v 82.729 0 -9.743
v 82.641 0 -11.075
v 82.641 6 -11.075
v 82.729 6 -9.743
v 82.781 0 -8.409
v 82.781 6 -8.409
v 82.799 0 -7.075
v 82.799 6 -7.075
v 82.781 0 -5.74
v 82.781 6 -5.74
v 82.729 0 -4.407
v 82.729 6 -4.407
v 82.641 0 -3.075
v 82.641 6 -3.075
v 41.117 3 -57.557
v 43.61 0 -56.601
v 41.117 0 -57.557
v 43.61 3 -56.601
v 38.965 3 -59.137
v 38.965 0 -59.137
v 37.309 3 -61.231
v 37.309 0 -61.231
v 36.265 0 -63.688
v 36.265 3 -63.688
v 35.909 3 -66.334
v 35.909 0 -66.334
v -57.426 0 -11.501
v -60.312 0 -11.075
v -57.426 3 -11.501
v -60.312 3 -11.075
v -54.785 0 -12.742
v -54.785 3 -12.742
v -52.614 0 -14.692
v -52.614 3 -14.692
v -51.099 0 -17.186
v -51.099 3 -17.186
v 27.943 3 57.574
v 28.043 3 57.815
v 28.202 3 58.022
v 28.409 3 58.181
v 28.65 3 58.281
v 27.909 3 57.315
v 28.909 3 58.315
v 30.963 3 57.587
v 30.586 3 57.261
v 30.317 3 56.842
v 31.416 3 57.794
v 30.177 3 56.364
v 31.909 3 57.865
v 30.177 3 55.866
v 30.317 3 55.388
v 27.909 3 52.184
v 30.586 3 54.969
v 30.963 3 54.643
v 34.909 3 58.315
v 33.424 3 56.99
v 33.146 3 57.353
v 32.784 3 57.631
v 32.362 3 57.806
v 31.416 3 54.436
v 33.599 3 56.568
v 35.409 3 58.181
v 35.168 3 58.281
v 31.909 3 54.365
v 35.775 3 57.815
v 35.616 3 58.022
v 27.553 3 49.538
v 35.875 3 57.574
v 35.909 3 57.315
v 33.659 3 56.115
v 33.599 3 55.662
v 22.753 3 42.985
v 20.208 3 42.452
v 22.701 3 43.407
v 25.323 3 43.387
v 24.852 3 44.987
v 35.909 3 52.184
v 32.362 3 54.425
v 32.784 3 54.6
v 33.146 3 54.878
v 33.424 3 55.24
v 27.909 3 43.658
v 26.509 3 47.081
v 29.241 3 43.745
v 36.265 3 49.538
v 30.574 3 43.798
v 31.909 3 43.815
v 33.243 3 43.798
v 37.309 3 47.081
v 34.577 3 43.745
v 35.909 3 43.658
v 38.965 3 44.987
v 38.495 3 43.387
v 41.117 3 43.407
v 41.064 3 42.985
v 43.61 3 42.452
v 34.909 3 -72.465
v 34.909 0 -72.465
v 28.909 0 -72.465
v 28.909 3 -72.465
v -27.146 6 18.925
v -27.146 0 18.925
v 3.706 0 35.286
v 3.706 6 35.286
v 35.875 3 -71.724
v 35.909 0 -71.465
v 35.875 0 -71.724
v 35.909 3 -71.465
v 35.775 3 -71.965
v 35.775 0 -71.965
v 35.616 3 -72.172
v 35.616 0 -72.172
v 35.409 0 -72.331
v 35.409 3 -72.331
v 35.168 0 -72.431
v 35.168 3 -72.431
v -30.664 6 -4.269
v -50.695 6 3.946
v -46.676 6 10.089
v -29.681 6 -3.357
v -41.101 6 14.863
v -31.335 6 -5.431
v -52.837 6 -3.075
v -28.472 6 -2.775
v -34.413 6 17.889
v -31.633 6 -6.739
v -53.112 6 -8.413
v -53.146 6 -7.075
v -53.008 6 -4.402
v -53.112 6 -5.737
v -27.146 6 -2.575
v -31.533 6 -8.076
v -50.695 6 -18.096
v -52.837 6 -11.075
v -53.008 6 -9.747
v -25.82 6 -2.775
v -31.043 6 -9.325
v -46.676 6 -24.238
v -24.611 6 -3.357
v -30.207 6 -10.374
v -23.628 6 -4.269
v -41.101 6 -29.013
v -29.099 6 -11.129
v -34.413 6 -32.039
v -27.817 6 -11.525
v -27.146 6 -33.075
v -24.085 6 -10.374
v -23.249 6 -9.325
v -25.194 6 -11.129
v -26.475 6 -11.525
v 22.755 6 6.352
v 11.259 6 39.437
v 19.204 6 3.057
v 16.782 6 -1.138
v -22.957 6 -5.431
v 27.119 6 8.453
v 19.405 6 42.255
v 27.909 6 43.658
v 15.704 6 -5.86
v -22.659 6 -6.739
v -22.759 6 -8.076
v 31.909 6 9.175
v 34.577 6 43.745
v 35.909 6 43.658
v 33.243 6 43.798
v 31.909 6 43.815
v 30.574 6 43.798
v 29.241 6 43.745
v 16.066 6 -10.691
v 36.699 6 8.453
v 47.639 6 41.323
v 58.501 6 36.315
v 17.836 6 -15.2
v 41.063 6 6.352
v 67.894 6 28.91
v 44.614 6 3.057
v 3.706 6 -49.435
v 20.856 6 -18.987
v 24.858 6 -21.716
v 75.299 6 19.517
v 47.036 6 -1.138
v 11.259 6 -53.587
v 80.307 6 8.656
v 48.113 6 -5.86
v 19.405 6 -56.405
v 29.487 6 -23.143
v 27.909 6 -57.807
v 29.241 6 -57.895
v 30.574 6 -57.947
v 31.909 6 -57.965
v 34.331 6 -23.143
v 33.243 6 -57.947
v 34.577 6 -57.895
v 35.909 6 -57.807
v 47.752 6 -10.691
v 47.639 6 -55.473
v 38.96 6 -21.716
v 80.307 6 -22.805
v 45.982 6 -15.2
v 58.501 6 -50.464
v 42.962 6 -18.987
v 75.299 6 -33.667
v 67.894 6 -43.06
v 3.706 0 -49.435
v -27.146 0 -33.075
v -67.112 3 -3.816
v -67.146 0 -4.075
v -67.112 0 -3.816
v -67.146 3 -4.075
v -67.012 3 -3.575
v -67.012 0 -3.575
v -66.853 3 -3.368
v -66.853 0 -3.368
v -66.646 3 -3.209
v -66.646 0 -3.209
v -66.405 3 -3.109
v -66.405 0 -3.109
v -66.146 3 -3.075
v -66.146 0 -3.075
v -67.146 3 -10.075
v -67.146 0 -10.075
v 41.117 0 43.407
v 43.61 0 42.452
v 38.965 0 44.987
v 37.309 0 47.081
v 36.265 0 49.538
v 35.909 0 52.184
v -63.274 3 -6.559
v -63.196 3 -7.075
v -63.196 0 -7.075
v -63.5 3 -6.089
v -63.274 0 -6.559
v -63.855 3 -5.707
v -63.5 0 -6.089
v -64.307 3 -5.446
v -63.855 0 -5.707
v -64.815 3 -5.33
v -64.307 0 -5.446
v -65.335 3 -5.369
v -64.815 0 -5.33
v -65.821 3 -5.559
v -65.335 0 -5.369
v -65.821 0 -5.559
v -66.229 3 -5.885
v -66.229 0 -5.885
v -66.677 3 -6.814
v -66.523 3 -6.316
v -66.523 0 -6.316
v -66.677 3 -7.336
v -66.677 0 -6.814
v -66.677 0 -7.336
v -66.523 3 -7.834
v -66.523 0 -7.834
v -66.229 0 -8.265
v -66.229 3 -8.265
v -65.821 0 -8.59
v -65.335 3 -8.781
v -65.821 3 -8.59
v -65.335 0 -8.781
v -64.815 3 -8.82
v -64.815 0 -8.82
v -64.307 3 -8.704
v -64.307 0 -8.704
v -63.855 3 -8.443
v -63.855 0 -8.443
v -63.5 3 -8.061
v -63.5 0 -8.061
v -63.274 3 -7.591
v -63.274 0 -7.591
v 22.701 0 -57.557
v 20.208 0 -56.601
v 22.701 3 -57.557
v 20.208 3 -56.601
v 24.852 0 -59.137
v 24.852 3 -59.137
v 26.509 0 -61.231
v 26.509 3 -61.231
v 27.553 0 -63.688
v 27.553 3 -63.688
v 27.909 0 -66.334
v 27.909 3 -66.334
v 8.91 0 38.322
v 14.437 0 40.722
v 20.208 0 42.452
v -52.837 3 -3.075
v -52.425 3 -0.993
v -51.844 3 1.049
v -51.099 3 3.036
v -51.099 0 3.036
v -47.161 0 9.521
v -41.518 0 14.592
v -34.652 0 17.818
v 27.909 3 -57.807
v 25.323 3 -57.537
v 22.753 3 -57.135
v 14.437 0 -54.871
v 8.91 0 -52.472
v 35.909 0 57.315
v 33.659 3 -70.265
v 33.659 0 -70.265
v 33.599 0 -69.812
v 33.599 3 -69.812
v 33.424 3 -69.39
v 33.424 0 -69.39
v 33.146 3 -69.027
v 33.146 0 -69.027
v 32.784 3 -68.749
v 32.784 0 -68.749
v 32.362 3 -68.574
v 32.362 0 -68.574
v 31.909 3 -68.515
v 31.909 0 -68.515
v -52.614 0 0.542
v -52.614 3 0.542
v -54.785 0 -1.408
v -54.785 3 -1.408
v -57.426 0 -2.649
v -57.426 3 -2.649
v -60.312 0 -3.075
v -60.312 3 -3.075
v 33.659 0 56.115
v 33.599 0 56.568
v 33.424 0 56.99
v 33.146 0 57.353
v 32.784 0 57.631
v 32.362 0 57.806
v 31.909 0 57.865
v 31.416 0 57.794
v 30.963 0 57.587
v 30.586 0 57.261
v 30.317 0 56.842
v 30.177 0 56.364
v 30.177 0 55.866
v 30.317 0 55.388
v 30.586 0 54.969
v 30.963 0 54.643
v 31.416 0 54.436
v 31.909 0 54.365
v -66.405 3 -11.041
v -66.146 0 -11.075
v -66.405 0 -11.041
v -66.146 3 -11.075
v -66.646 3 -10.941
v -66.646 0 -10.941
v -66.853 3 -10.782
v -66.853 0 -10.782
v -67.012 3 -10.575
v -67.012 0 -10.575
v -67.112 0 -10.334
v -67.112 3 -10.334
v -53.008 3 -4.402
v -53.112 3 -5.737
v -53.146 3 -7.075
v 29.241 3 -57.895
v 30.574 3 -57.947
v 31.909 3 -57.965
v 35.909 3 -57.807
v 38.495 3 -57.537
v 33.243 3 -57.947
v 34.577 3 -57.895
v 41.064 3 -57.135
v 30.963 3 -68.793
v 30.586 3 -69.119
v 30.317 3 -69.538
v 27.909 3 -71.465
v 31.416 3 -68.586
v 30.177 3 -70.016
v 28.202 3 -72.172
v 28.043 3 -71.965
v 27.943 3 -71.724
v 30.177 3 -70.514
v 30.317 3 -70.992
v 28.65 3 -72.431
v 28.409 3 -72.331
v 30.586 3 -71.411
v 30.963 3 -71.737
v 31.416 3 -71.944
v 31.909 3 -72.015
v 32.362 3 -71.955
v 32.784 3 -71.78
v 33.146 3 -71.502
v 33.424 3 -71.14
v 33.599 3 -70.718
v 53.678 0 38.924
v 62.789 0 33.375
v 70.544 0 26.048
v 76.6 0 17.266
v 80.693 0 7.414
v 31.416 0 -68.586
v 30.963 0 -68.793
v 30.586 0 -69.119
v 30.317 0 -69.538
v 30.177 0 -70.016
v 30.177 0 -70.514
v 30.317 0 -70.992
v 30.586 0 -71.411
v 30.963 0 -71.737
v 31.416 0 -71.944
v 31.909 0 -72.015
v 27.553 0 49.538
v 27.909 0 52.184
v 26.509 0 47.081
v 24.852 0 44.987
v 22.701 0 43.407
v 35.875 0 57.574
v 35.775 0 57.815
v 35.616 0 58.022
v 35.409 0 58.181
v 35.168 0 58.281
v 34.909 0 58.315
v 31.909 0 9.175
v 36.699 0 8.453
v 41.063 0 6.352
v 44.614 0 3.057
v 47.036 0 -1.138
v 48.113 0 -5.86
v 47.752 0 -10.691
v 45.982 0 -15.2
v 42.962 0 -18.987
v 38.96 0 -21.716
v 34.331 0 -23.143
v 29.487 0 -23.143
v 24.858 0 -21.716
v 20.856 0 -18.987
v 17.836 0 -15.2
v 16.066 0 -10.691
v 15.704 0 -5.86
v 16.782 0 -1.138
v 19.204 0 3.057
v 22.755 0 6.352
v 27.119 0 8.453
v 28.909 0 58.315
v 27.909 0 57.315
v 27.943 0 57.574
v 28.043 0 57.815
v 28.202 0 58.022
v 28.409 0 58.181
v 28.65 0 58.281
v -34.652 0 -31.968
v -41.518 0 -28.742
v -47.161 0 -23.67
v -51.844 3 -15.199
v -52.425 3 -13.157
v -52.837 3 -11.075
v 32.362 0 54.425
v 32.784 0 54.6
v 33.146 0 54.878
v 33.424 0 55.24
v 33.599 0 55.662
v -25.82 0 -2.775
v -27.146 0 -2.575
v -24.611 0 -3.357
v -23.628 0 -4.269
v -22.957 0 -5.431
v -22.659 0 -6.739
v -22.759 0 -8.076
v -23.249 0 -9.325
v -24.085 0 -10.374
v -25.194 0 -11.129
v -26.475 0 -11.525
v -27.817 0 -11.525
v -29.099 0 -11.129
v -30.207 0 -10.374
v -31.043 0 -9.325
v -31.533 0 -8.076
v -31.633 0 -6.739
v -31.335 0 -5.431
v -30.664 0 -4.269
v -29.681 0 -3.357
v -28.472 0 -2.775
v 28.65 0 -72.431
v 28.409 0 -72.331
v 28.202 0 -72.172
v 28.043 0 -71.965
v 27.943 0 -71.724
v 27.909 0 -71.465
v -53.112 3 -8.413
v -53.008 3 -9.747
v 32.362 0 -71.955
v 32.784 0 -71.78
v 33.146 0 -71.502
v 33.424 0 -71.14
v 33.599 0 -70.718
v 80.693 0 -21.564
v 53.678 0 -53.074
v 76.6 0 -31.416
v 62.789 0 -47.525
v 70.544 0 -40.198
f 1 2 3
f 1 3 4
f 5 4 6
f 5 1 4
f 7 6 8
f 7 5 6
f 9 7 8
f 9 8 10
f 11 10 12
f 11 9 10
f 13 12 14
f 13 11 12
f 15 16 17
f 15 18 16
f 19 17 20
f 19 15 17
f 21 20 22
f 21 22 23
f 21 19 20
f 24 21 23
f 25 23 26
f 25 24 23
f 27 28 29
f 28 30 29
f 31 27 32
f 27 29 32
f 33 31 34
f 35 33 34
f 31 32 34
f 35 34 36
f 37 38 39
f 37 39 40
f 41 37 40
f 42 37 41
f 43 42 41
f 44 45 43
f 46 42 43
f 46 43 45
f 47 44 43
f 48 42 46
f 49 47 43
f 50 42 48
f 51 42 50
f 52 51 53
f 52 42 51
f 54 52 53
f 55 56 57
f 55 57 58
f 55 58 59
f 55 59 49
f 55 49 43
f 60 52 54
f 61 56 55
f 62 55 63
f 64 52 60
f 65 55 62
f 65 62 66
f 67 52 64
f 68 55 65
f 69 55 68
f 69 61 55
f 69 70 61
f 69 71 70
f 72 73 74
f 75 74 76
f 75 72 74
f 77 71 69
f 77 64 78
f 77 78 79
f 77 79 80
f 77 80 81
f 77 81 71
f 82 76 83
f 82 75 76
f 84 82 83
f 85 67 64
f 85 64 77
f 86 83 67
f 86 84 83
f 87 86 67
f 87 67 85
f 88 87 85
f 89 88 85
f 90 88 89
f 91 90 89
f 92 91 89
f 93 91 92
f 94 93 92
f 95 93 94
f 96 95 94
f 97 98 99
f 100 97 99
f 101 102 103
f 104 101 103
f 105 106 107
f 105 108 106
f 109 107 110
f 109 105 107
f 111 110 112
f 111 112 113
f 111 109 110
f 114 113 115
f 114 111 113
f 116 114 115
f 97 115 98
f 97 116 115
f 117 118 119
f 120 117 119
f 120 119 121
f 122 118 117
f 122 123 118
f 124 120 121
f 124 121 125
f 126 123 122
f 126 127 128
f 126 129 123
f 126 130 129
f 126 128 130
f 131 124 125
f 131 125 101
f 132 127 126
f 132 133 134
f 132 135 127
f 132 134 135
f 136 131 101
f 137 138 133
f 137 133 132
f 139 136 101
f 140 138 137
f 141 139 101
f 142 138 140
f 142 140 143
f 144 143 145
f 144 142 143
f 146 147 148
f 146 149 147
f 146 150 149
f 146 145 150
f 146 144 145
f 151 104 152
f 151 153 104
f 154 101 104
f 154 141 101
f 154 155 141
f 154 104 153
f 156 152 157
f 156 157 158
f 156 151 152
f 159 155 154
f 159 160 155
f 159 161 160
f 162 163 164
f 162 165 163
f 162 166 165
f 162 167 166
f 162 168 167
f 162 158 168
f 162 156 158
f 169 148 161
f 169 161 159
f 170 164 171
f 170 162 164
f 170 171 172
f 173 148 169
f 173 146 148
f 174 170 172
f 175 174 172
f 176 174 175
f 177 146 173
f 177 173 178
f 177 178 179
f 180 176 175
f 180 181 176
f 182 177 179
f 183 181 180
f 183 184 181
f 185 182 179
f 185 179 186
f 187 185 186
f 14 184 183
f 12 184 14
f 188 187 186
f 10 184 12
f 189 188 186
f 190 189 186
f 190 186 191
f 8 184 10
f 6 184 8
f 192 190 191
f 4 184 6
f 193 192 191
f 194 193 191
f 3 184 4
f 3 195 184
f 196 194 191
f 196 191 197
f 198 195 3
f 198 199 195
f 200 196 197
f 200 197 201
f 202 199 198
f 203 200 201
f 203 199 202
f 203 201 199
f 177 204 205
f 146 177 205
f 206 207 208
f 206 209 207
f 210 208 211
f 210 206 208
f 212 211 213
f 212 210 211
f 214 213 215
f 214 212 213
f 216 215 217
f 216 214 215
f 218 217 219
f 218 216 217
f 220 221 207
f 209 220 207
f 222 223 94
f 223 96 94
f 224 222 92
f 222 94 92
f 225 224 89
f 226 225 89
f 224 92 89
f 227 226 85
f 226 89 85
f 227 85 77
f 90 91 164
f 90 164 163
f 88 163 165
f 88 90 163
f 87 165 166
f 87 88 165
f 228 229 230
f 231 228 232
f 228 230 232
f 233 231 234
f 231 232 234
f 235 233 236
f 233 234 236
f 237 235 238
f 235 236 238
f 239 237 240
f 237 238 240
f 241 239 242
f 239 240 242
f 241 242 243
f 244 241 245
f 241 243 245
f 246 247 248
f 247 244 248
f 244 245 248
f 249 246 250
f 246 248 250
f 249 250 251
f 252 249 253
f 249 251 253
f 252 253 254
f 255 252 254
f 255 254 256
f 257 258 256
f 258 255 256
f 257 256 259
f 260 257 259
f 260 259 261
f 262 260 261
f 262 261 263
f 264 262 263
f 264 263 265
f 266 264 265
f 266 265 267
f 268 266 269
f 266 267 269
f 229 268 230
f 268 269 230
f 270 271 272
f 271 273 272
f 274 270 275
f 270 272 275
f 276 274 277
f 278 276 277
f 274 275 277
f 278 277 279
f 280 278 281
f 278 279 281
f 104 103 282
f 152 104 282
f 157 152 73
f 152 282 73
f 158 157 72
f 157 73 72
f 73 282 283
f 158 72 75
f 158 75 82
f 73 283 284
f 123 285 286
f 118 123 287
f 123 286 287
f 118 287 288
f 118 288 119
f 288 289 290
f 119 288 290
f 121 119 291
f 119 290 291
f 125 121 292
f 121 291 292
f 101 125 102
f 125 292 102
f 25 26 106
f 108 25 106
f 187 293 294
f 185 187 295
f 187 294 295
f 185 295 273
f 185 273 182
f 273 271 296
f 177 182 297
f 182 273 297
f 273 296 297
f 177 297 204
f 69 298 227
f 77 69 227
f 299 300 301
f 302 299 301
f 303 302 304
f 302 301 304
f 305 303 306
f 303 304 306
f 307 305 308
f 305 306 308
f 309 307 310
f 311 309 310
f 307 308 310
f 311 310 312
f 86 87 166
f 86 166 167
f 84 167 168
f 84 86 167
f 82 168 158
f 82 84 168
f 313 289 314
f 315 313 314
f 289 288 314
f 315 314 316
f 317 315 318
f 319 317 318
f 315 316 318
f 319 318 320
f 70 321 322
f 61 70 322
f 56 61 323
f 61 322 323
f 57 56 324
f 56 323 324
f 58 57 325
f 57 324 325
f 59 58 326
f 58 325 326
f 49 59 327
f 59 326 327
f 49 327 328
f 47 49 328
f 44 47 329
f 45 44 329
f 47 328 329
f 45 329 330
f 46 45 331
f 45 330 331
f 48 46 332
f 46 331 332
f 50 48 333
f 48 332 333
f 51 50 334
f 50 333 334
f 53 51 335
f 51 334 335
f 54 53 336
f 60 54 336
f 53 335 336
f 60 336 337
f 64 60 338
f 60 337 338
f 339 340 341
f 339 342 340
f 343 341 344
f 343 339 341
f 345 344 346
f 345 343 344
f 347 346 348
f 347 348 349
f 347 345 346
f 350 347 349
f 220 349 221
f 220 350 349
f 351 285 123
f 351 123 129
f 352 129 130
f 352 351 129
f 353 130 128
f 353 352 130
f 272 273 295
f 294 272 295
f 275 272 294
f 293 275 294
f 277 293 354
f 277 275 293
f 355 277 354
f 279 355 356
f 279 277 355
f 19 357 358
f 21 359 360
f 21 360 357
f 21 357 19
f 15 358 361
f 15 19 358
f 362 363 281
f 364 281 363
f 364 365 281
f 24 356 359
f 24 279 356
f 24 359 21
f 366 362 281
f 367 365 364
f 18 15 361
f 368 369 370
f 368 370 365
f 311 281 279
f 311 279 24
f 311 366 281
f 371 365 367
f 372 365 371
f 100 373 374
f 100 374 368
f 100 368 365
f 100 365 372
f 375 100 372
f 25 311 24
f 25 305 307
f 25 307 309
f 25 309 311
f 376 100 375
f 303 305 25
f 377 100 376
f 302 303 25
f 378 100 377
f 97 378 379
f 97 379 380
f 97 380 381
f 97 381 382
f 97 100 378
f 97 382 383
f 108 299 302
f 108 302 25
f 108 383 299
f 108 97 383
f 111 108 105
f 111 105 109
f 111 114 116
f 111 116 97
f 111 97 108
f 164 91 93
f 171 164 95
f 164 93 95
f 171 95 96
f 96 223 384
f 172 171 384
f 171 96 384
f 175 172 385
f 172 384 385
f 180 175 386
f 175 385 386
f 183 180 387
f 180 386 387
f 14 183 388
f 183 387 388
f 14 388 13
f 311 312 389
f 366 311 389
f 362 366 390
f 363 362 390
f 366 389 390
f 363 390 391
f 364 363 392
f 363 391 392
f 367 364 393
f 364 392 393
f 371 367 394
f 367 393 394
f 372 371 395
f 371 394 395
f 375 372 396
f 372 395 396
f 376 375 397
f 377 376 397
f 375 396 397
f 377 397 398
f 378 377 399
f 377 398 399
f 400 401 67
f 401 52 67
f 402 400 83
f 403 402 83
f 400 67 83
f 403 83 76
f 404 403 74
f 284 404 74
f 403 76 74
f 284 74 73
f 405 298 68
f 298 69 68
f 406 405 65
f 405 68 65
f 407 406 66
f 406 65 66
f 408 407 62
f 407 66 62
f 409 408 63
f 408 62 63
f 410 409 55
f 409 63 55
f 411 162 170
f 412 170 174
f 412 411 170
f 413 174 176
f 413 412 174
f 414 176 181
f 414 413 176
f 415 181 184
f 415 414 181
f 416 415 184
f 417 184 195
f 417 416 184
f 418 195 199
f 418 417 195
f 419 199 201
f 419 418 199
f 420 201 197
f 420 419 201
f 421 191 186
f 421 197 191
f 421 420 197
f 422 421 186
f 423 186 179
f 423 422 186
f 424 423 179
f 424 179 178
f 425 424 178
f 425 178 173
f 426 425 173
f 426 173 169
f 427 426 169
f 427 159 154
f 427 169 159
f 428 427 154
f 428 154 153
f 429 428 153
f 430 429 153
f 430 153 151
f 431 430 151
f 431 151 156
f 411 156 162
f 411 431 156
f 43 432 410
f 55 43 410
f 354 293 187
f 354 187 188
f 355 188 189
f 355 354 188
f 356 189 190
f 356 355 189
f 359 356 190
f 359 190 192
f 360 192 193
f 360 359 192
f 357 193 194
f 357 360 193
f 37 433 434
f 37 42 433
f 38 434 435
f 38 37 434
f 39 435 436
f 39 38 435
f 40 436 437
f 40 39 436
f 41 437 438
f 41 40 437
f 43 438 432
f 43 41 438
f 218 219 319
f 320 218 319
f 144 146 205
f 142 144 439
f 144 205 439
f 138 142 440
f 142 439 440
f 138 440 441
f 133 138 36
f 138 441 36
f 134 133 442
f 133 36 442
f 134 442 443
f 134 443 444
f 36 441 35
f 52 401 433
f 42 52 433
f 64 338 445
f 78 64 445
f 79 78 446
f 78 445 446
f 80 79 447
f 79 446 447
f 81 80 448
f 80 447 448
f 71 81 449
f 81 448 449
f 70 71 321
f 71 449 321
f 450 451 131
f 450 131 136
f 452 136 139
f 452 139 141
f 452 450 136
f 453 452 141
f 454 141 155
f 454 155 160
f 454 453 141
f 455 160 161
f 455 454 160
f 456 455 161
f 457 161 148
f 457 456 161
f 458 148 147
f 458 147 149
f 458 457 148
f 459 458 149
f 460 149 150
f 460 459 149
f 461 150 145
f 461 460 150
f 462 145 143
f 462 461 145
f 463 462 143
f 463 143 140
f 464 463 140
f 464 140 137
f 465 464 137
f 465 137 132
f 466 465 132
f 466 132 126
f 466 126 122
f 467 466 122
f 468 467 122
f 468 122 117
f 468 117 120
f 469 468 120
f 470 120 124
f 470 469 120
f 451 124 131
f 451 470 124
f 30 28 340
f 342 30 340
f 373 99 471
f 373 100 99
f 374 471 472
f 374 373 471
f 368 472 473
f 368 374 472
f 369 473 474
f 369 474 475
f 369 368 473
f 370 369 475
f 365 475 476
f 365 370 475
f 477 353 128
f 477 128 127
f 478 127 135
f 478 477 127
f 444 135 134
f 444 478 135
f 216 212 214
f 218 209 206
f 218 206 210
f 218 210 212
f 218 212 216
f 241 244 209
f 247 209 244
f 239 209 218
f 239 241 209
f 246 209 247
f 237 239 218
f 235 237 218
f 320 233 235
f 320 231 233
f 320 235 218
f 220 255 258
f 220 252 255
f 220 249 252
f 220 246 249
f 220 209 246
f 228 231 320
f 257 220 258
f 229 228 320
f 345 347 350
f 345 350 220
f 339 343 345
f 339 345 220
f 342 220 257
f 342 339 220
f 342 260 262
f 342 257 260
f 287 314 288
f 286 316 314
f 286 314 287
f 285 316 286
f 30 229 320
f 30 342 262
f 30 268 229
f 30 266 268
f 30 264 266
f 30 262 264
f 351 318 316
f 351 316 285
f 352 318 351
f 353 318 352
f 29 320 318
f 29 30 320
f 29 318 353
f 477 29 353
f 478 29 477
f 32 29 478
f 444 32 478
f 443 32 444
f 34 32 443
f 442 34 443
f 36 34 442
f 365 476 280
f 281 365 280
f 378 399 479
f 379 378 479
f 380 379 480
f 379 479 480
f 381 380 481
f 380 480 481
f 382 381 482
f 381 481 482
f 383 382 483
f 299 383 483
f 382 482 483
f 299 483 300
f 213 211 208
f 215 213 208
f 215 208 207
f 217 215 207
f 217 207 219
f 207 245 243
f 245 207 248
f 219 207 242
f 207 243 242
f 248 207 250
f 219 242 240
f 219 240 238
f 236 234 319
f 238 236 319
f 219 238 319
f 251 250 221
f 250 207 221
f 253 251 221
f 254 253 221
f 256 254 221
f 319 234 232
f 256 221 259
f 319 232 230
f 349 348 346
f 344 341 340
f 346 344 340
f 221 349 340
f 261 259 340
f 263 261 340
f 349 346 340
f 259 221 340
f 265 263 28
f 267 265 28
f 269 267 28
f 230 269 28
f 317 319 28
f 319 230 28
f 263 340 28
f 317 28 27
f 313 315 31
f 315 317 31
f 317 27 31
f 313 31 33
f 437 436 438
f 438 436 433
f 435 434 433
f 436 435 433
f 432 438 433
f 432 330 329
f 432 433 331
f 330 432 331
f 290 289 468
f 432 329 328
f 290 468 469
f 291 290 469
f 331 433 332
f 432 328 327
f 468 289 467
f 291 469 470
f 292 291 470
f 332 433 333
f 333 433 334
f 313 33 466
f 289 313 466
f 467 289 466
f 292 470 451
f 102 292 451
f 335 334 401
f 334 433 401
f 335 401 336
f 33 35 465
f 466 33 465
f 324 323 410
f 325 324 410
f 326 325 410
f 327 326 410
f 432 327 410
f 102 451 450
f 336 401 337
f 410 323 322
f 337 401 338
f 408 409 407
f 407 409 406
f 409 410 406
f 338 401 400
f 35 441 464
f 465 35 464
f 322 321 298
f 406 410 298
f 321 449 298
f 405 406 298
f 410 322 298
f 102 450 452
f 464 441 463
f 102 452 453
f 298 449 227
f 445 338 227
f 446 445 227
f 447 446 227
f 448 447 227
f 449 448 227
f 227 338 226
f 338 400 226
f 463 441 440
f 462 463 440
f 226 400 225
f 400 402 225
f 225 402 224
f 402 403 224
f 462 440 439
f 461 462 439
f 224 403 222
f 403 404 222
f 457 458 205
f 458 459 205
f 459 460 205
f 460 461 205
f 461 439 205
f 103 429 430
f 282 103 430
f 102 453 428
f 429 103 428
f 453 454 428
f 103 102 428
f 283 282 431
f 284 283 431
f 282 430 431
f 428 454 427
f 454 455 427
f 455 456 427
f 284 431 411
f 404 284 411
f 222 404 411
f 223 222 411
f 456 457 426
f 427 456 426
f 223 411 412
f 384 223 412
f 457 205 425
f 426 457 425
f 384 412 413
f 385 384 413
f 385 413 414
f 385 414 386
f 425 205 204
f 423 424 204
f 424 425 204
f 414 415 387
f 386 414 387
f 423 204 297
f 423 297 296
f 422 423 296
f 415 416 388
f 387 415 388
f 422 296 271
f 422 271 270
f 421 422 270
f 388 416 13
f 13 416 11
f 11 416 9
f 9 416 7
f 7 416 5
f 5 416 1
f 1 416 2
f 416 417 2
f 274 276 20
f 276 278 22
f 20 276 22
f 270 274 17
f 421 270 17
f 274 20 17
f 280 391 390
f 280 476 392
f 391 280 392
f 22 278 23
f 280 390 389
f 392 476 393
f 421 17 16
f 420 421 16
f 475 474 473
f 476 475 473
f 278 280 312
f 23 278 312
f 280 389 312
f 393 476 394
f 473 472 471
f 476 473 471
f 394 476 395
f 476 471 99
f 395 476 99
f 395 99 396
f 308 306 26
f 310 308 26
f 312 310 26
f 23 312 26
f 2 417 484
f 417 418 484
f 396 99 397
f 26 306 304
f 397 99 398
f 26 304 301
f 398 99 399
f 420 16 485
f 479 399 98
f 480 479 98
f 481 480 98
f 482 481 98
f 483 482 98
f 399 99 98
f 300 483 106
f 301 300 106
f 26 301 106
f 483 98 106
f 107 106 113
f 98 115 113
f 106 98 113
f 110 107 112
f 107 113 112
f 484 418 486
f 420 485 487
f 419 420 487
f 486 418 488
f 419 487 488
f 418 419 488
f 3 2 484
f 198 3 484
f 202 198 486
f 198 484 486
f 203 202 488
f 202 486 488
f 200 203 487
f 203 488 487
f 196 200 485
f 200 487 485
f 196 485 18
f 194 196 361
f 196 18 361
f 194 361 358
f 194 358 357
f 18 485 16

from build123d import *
from build123d.topology import SkipClean

# Parameters (mm, degrees)
SKETCH1_R           = 4.5
BOSS_EXTRUDE1_DEPTH = 6
BOSS_EXTRUDE5_DEPTH = 6
BOSS_EXTRUDE3_START = -6
BOSS_EXTRUDE3_DEPTH = 6
CUT_EXTRUDE1_START  = -3
CUT_EXTRUDE1_DEPTH  = 3
BOSS_EXTRUDE4_START = -6
BOSS_EXTRUDE4_DEPTH = 6
CUT_EXTRUDE2_START  = -3
CUT_EXTRUDE2_DEPTH  = 3
BOSS_EXTRUDE7_START = -3
BOSS_EXTRUDE7_DEPTH = 3
BOSS_EXTRUDE9_START = -6
BOSS_EXTRUDE9_DEPTH = 6
CUT_EXTRUDE4_START  = -3
CUT_EXTRUDE4_DEPTH  = 3
FILLET1_R           = 1
FILLET2_R           = 10
CUT_EXTRUDE5_START  = -6
CUT_EXTRUDE5_DEPTH  = 6
SKETCH1_6_R         = 16.25
SKETCH1_6_R_2       = 4.5
CUT_EXTRUDE8_DEPTH  = 10


with BuildPart() as part:
    # Sketch1 → Boss-Extrude1 (new body)
    with BuildSketch(Plane(origin=(0, 0, 0), x_dir=(1, 0, 0), z_dir=(0, 1, 0))):
        with BuildLine():
            Line((3.706249193, 49.435224426), (-27.146075319, 33.07485149))
            ThreePointArc((-27.146075319, 33.07485149), (-53.146075319, 7.07485149), (-27.146075319, -18.92514851))
            Line((-27.146075319, -18.92514851), (3.706249193, -35.285521446))
            ThreePointArc((3.706249193, -35.285521446), (82.798924681, 7.07485149), (3.706249193, 49.435224426))
        make_face()
        with Locations(Location((-27.146075319, 7.07485149, 0), (0, 0, 270))):
            Circle(SKETCH1_R, mode=Mode.SUBTRACT)
    extrude(amount=BOSS_EXTRUDE1_DEPTH)

    # Sketch1<3> → Boss-Extrude5 (add)
    with BuildSketch(Plane(origin=(0, 0, 0), x_dir=(1, 0, 0), z_dir=(0, 1, 0))):
        with BuildLine():
            ThreePointArc((-16.299337932, -9.227158073), (-13.7342993, -15.430441322), (-10.375107984, -21.242151909))
            Line((-10.375107984, -21.242151909), (3.706249193, -27.385705604))
            ThreePointArc((3.706249193, -27.385705604), (-5.156108472, -17.605185328), (-10.76229626, -5.656519346))
            ThreePointArc((-10.76229626, -5.656519346), (-12.682785992, -8.75689294), (-16.299337932, -9.227158073))
        make_face()
    extrude(amount=BOSS_EXTRUDE5_DEPTH)

    # Sketch2 → Boss-Extrude3 (add)
    with BuildSketch(Plane(origin=(0, 6, 0), x_dir=(1, 0, 0), z_dir=(0, 1, 0)).offset(BOSS_EXTRUDE3_START)):
        with BuildLine():
            ThreePointArc((-53.146075319, 7.07485149), (-53.068576106, 9.080830791), (-52.836540476, 11.07485149))
            Line((-52.836540476, 11.07485149), (-67.146075316, 11.07485149))
            Line((-67.146075316, 11.07485149), (-67.146075316, 7.07485149))
            Line((-67.146075316, 7.07485149), (-66.696075316, 7.07485149))
            ThreePointArc((-66.696075316, 7.07485149), (-64.946075316, 8.82485149), (-63.196075316, 7.07485149))
            Line((-63.196075316, 7.07485149), (-53.146075319, 7.07485149))
        make_face()
        with BuildLine():
            ThreePointArc((-52.836540476, 3.07485149), (-53.068576106, 5.06887219), (-53.146075319, 7.07485149))
            Line((-53.146075319, 7.07485149), (-63.196075316, 7.07485149))
            ThreePointArc((-63.196075316, 7.07485149), (-64.946075316, 5.32485149), (-66.696075316, 7.07485149))
            Line((-66.696075316, 7.07485149), (-67.146075316, 7.07485149))
            Line((-67.146075316, 7.07485149), (-67.146075316, 3.07485149))
            Line((-67.146075316, 3.07485149), (-52.836540476, 3.07485149))
        make_face()
        with BuildLine():
            Line((97.688924678, 11.07485149), (82.641479318, 11.07485149))
            ThreePointArc((82.641479318, 11.07485149), (82.759548106, 9.076400206), (82.798924681, 7.07485149))
            Line((82.798924681, 7.07485149), (93.738924678, 7.07485149))
            ThreePointArc((93.738924678, 7.07485149), (95.488924678, 8.82485149), (97.238924678, 7.07485149))
            Line((97.238924678, 7.07485149), (97.688924678, 7.07485149))
            Line((97.688924678, 7.07485149), (97.688924678, 11.07485149))
        make_face()
        with BuildLine():
            Line((93.738924678, 7.07485149), (82.798924681, 7.07485149))
            ThreePointArc((82.798924681, 7.07485149), (82.759548106, 5.073302775), (82.641479318, 3.07485149))
            Line((82.641479318, 3.07485149), (97.688924678, 3.07485149))
            Line((97.688924678, 3.07485149), (97.688924678, 7.07485149))
            Line((97.688924678, 7.07485149), (97.238924678, 7.07485149))
            ThreePointArc((97.238924678, 7.07485149), (95.488924678, 5.32485149), (93.738924678, 7.07485149))
        make_face()
    extrude(amount=BOSS_EXTRUDE3_DEPTH)

    # Sketch2<11> → Cut-Extrude1 (cut)
    with SkipClean():  # the faces are left unmerged after this step: merging them gives an invalid solid
        with BuildSketch(Plane(origin=(0, 6, 0), x_dir=(1, 0, 0), z_dir=(0, 1, 0)).offset(CUT_EXTRUDE1_START)):
            with BuildLine():
                ThreePointArc((-52.836540476, 3.07485149), (-53.068576106, 5.06887219), (-53.146075319, 7.07485149))
                Line((-53.146075319, 7.07485149), (-63.196075316, 7.07485149))
                ThreePointArc((-63.196075316, 7.07485149), (-64.946075316, 5.32485149), (-66.696075316, 7.07485149))
                Line((-66.696075316, 7.07485149), (-67.146075316, 7.07485149))
                Line((-67.146075316, 7.07485149), (-67.146075316, 3.07485149))
                Line((-67.146075316, 3.07485149), (-52.836540476, 3.07485149))
            make_face()
            with BuildLine():
                ThreePointArc((-53.146075319, 7.07485149), (-53.068576106, 9.080830791), (-52.836540476, 11.07485149))
                Line((-52.836540476, 11.07485149), (-67.146075316, 11.07485149))
                Line((-67.146075316, 11.07485149), (-67.146075316, 7.07485149))
                Line((-67.146075316, 7.07485149), (-66.696075316, 7.07485149))
                ThreePointArc((-66.696075316, 7.07485149), (-64.946075316, 8.82485149), (-63.196075316, 7.07485149))
                Line((-63.196075316, 7.07485149), (-53.146075319, 7.07485149))
            make_face()
        extrude(amount=CUT_EXTRUDE1_DEPTH, mode=Mode.SUBTRACT)

    # Sketch2<13> → Boss-Extrude4 (add)
    with SkipClean():  # the faces are left unmerged after this step: merging them gives an invalid solid
        with BuildSketch(Plane(origin=(0, 6, 0), x_dir=(1, 0, 0), z_dir=(0, 1, 0)).offset(BOSS_EXTRUDE4_START)):
            with BuildLine():
                Line((93.738924678, 7.07485149), (82.798924681, 7.07485149))
                ThreePointArc((82.798924681, 7.07485149), (82.759548106, 5.073302775), (82.641479318, 3.07485149))
                Line((82.641479318, 3.07485149), (97.688924678, 3.07485149))
                Line((97.688924678, 3.07485149), (97.688924678, 7.07485149))
                Line((97.688924678, 7.07485149), (97.238924678, 7.07485149))
                ThreePointArc((97.238924678, 7.07485149), (95.488924678, 5.32485149), (93.738924678, 7.07485149))
            make_face()
            with BuildLine():
                Line((97.688924678, 11.07485149), (82.641479318, 11.07485149))
                ThreePointArc((82.641479318, 11.07485149), (82.759548106, 9.076400206), (82.798924681, 7.07485149))
                Line((82.798924681, 7.07485149), (93.738924678, 7.07485149))
                ThreePointArc((93.738924678, 7.07485149), (95.488924678, 8.82485149), (97.238924678, 7.07485149))
                Line((97.238924678, 7.07485149), (97.688924678, 7.07485149))
                Line((97.688924678, 7.07485149), (97.688924678, 11.07485149))
            make_face()
        extrude(amount=BOSS_EXTRUDE4_DEPTH)

    # Sketch2<15> → Cut-Extrude2 (cut)
    with SkipClean():  # the faces are left unmerged after this step: merging them gives an invalid solid
        with BuildSketch(Plane(origin=(0, 6, 0), x_dir=(1, 0, 0), z_dir=(0, 1, 0)).offset(CUT_EXTRUDE2_START)):
            with BuildLine():
                Line((93.738924678, 7.07485149), (82.798924681, 7.07485149))
                ThreePointArc((82.798924681, 7.07485149), (82.759548106, 5.073302775), (82.641479318, 3.07485149))
                Line((82.641479318, 3.07485149), (97.688924678, 3.07485149))
                Line((97.688924678, 3.07485149), (97.688924678, 7.07485149))
                Line((97.688924678, 7.07485149), (97.238924678, 7.07485149))
                ThreePointArc((97.238924678, 7.07485149), (95.488924678, 5.32485149), (93.738924678, 7.07485149))
            make_face()
            with BuildLine():
                Line((97.688924678, 11.07485149), (82.641479318, 11.07485149))
                ThreePointArc((82.641479318, 11.07485149), (82.759548106, 9.076400206), (82.798924681, 7.07485149))
                Line((82.798924681, 7.07485149), (93.738924678, 7.07485149))
                ThreePointArc((93.738924678, 7.07485149), (95.488924678, 8.82485149), (97.238924678, 7.07485149))
                Line((97.238924678, 7.07485149), (97.688924678, 7.07485149))
                Line((97.688924678, 7.07485149), (97.688924678, 11.07485149))
            make_face()
        extrude(amount=CUT_EXTRUDE2_DEPTH, mode=Mode.SUBTRACT)

    # Sketch2<16> → Boss-Extrude7 (add)
    with BuildSketch(Plane(origin=(0, 6, 0), x_dir=(1, 0, 0), z_dir=(0, 1, 0)).offset(BOSS_EXTRUDE7_START)):
        with BuildLine():
            Line((93.738924678, 7.07485149), (82.798924681, 7.07485149))
            ThreePointArc((82.798924681, 7.07485149), (82.759548106, 5.073302775), (82.641479318, 3.07485149))
            Line((82.641479318, 3.07485149), (97.688924678, 3.07485149))
            Line((97.688924678, 3.07485149), (97.688924678, 7.07485149))
            Line((97.688924678, 7.07485149), (97.238924678, 7.07485149))
            ThreePointArc((97.238924678, 7.07485149), (95.488924678, 5.32485149), (93.738924678, 7.07485149))
        make_face()
        with BuildLine():
            Line((97.688924678, 11.07485149), (82.641479318, 11.07485149))
            ThreePointArc((82.641479318, 11.07485149), (82.759548106, 9.076400206), (82.798924681, 7.07485149))
            Line((82.798924681, 7.07485149), (93.738924678, 7.07485149))
            ThreePointArc((93.738924678, 7.07485149), (95.488924678, 8.82485149), (97.238924678, 7.07485149))
            Line((97.238924678, 7.07485149), (97.688924678, 7.07485149))
            Line((97.688924678, 7.07485149), (97.688924678, 11.07485149))
        make_face()
        with BuildLine():
            ThreePointArc((-53.146075319, 7.07485149), (-53.068576106, 9.080830791), (-52.836540476, 11.07485149))
            Line((-52.836540476, 11.07485149), (-67.146075316, 11.07485149))
            Line((-67.146075316, 11.07485149), (-67.146075316, 7.07485149))
            Line((-67.146075316, 7.07485149), (-66.696075316, 7.07485149))
            ThreePointArc((-66.696075316, 7.07485149), (-64.946075316, 8.82485149), (-63.196075316, 7.07485149))
            Line((-63.196075316, 7.07485149), (-53.146075319, 7.07485149))
        make_face()
        with BuildLine():
            ThreePointArc((-52.836540476, 3.07485149), (-53.068576106, 5.06887219), (-53.146075319, 7.07485149))
            Line((-53.146075319, 7.07485149), (-63.196075316, 7.07485149))
            ThreePointArc((-63.196075316, 7.07485149), (-64.946075316, 5.32485149), (-66.696075316, 7.07485149))
            Line((-66.696075316, 7.07485149), (-67.146075316, 7.07485149))
            Line((-67.146075316, 7.07485149), (-67.146075316, 3.07485149))
            Line((-67.146075316, 3.07485149), (-52.836540476, 3.07485149))
        make_face()
    extrude(amount=BOSS_EXTRUDE7_DEPTH)

    # Sketch2<19> → Boss-Extrude9 (add)
    with BuildSketch(Plane(origin=(0, 6, 0), x_dir=(1, 0, 0), z_dir=(0, 1, 0)).offset(BOSS_EXTRUDE9_START)):
        with BuildLine():
            ThreePointArc((31.908924681, -43.81514851), (29.907375966, -43.775771935), (27.908924681, -43.657703147))
            Line((27.908924681, -43.657703147), (27.908924681, -58.31514851))
            Line((27.908924681, -58.31514851), (31.908924681, -58.31514851))
            Line((31.908924681, -58.31514851), (31.908924681, -57.86514851))
            ThreePointArc((31.908924681, -57.86514851), (30.158924681, -56.11514851), (31.908924681, -54.36514851))
            Line((31.908924681, -54.36514851), (31.908924681, -43.81514851))
        make_face()
        with BuildLine():
            ThreePointArc((35.908924681, -43.657703147), (33.910473397, -43.775771935), (31.908924681, -43.81514851))
            Line((31.908924681, -43.81514851), (31.908924681, -54.36514851))
            ThreePointArc((31.908924681, -54.36514851), (33.146361548, -54.877711643), (33.658924681, -56.11514851))
            ThreePointArc((33.658924681, -56.11514851), (33.146361548, -57.352585377), (31.908924681, -57.86514851))
            Line((31.908924681, -57.86514851), (31.908924681, -58.31514851))
            Line((31.908924681, -58.31514851), (35.908924681, -58.31514851))
            Line((35.908924681, -58.31514851), (35.908924681, -43.657703147))
        make_face()
        with BuildLine():
            Line((31.908924681, 68.51485149), (31.908924681, 57.96485149))
            ThreePointArc((31.908924681, 57.96485149), (33.910473397, 57.925474916), (35.908924681, 57.807406127))
            Line((35.908924681, 57.807406127), (35.908924681, 72.46485149))
            Line((35.908924681, 72.46485149), (31.908924681, 72.46485149))
            Line((31.908924681, 72.46485149), (31.908924681, 72.01485149))
            ThreePointArc((31.908924681, 72.01485149), (33.146361548, 71.502288357), (33.658924681, 70.26485149))
            ThreePointArc((33.658924681, 70.26485149), (33.146361548, 69.027414623), (31.908924681, 68.51485149))
        make_face()
        with BuildLine():
            Line((27.908924681, 72.46485149), (27.908924681, 57.807406127))
            ThreePointArc((27.908924681, 57.807406127), (29.907375966, 57.925474916), (31.908924681, 57.96485149))
            Line((31.908924681, 57.96485149), (31.908924681, 68.51485149))
            ThreePointArc((31.908924681, 68.51485149), (30.158924681, 70.26485149), (31.908924681, 72.01485149))
            Line((31.908924681, 72.01485149), (31.908924681, 72.46485149))
            Line((31.908924681, 72.46485149), (27.908924681, 72.46485149))
        make_face()
    extrude(amount=BOSS_EXTRUDE9_DEPTH)

    # Sketch2<22> → Cut-Extrude4 (cut)
    with SkipClean():  # the faces are left unmerged after this step: merging them gives an invalid solid
        with BuildSketch(Plane(origin=(0, 6, 0), x_dir=(1, 0, 0), z_dir=(0, 1, 0)).offset(CUT_EXTRUDE4_START)):
            with BuildLine():
                ThreePointArc((35.908924681, -43.657703147), (33.910473397, -43.775771935), (31.908924681, -43.81514851))
                Line((31.908924681, -43.81514851), (31.908924681, -54.36514851))
                ThreePointArc((31.908924681, -54.36514851), (33.146361548, -54.877711643), (33.658924681, -56.11514851))
                ThreePointArc((33.658924681, -56.11514851), (33.146361548, -57.352585377), (31.908924681, -57.86514851))
                Line((31.908924681, -57.86514851), (31.908924681, -58.31514851))
                Line((31.908924681, -58.31514851), (35.908924681, -58.31514851))
                Line((35.908924681, -58.31514851), (35.908924681, -43.657703147))
            make_face()
            with BuildLine():
                ThreePointArc((31.908924681, -43.81514851), (29.907375966, -43.775771935), (27.908924681, -43.657703147))
                Line((27.908924681, -43.657703147), (27.908924681, -58.31514851))
                Line((27.908924681, -58.31514851), (31.908924681, -58.31514851))
                Line((31.908924681, -58.31514851), (31.908924681, -57.86514851))
                ThreePointArc((31.908924681, -57.86514851), (30.158924681, -56.11514851), (31.908924681, -54.36514851))
                Line((31.908924681, -54.36514851), (31.908924681, -43.81514851))
            make_face()
            with BuildLine():
                Line((31.908924681, 68.51485149), (31.908924681, 57.96485149))
                ThreePointArc((31.908924681, 57.96485149), (33.910473397, 57.925474916), (35.908924681, 57.807406127))
                Line((35.908924681, 57.807406127), (35.908924681, 72.46485149))
                Line((35.908924681, 72.46485149), (31.908924681, 72.46485149))
                Line((31.908924681, 72.46485149), (31.908924681, 72.01485149))
                ThreePointArc((31.908924681, 72.01485149), (33.146361548, 71.502288357), (33.658924681, 70.26485149))
                ThreePointArc((33.658924681, 70.26485149), (33.146361548, 69.027414623), (31.908924681, 68.51485149))
            make_face()
            with BuildLine():
                Line((27.908924681, 72.46485149), (27.908924681, 57.807406127))
                ThreePointArc((27.908924681, 57.807406127), (29.907375966, 57.925474916), (31.908924681, 57.96485149))
                Line((31.908924681, 57.96485149), (31.908924681, 68.51485149))
                ThreePointArc((31.908924681, 68.51485149), (30.158924681, 70.26485149), (31.908924681, 72.01485149))
                Line((31.908924681, 72.01485149), (31.908924681, 72.46485149))
                Line((31.908924681, 72.46485149), (27.908924681, 72.46485149))
            make_face()
            with BuildLine():
                ThreePointArc((-53.146075319, 7.07485149), (-53.068576106, 9.080830791), (-52.836540476, 11.07485149))
                Line((-52.836540476, 11.07485149), (-67.146075316, 11.07485149))
                Line((-67.146075316, 11.07485149), (-67.146075316, 7.07485149))
                Line((-67.146075316, 7.07485149), (-66.696075316, 7.07485149))
                ThreePointArc((-66.696075316, 7.07485149), (-64.946075316, 8.82485149), (-63.196075316, 7.07485149))
                Line((-63.196075316, 7.07485149), (-53.146075319, 7.07485149))
            make_face()
            with BuildLine():
                ThreePointArc((-52.836540476, 3.07485149), (-53.068576106, 5.06887219), (-53.146075319, 7.07485149))
                Line((-53.146075319, 7.07485149), (-63.196075316, 7.07485149))
                ThreePointArc((-63.196075316, 7.07485149), (-64.946075316, 5.32485149), (-66.696075316, 7.07485149))
                Line((-66.696075316, 7.07485149), (-67.146075316, 7.07485149))
                Line((-67.146075316, 7.07485149), (-67.146075316, 3.07485149))
                Line((-67.146075316, 3.07485149), (-52.836540476, 3.07485149))
            make_face()
        extrude(amount=CUT_EXTRUDE4_DEPTH, mode=Mode.SUBTRACT)

    # Fillet1
    fillet1_edges = [part.edges().sort_by_distance(p)[0] for p in [
        (35.908924681, 1.5, 58.31514851),
        (27.908924681, 1.5, 58.31514851),
        (27.908924681, 1.5, -72.46485149),
        (35.908924681, 1.5, -72.46485149),
        (-67.146075316, 1.5, -3.07485149),
        (-67.146075316, 1.5, -11.07485149),
    ]]
    fillet(fillet1_edges, radius=FILLET1_R)

    # Fillet2
    fillet2_edges = [part.edges().sort_by_distance(p)[0] for p in [
        (35.908924681, 1.5, 43.657703147),
        (27.908924681, 1.5, 43.657703147),
        (27.908924681, 1.5, -57.807406127),
        (35.908924681, 1.5, -57.807406127),
        (-52.836540476, 1.5, -3.07485149),
        (-52.836540476, 1.5, -11.07485149),
    ]]
    fillet(fillet2_edges, radius=FILLET2_R)

    # Sketch2<23> → Cut-Extrude5 (cut)
    with SkipClean():  # the faces are left unmerged after this step: merging them gives an invalid solid
        with BuildSketch(Plane(origin=(0, 6, 0), x_dir=(1, 0, 0), z_dir=(0, 1, 0)).offset(CUT_EXTRUDE5_START)):
            with BuildLine():
                Line((93.738924678, 7.07485149), (82.798924681, 7.07485149))
                ThreePointArc((82.798924681, 7.07485149), (82.759548106, 5.073302775), (82.641479318, 3.07485149))
                Line((82.641479318, 3.07485149), (97.688924678, 3.07485149))
                Line((97.688924678, 3.07485149), (97.688924678, 7.07485149))
                Line((97.688924678, 7.07485149), (97.238924678, 7.07485149))
                ThreePointArc((97.238924678, 7.07485149), (95.488924678, 5.32485149), (93.738924678, 7.07485149))
            make_face()
            with BuildLine():
                Line((97.688924678, 11.07485149), (82.641479318, 11.07485149))
                ThreePointArc((82.641479318, 11.07485149), (82.759548106, 9.076400206), (82.798924681, 7.07485149))
                Line((82.798924681, 7.07485149), (93.738924678, 7.07485149))
                ThreePointArc((93.738924678, 7.07485149), (95.488924678, 8.82485149), (97.238924678, 7.07485149))
                Line((97.238924678, 7.07485149), (97.688924678, 7.07485149))
                Line((97.688924678, 7.07485149), (97.688924678, 11.07485149))
            make_face()
        extrude(amount=CUT_EXTRUDE5_DEPTH, mode=Mode.SUBTRACT)

    # Sketch1<6> → Cut-Extrude8 (cut)
    with SkipClean():  # the faces are left unmerged after this step: merging them gives an invalid solid
        with BuildSketch(Plane(origin=(0, 0, 0), x_dir=(1, 0, 0), z_dir=(0, 1, 0))):
            with Locations(Location((31.908924681, 7.07485149, 0), (0, 0, 270))):
                Circle(SKETCH1_6_R)
            with Locations((31.908924681, 7.07485149)):
                Circle(SKETCH1_6_R_2, mode=Mode.SUBTRACT)
        extrude(amount=CUT_EXTRUDE8_DEPTH, mode=Mode.SUBTRACT)


with BuildPart() as cut_extrude8_kept_piece:
    # of the separate pieces the step leaves, the one the design keeps (cut_extrude8_pieces_kept)
    add(part.part.solids().sort_by_distance((35.908924681, 0, -66.333539461))[0])


solid = cut_extrude8_kept_piece.part
